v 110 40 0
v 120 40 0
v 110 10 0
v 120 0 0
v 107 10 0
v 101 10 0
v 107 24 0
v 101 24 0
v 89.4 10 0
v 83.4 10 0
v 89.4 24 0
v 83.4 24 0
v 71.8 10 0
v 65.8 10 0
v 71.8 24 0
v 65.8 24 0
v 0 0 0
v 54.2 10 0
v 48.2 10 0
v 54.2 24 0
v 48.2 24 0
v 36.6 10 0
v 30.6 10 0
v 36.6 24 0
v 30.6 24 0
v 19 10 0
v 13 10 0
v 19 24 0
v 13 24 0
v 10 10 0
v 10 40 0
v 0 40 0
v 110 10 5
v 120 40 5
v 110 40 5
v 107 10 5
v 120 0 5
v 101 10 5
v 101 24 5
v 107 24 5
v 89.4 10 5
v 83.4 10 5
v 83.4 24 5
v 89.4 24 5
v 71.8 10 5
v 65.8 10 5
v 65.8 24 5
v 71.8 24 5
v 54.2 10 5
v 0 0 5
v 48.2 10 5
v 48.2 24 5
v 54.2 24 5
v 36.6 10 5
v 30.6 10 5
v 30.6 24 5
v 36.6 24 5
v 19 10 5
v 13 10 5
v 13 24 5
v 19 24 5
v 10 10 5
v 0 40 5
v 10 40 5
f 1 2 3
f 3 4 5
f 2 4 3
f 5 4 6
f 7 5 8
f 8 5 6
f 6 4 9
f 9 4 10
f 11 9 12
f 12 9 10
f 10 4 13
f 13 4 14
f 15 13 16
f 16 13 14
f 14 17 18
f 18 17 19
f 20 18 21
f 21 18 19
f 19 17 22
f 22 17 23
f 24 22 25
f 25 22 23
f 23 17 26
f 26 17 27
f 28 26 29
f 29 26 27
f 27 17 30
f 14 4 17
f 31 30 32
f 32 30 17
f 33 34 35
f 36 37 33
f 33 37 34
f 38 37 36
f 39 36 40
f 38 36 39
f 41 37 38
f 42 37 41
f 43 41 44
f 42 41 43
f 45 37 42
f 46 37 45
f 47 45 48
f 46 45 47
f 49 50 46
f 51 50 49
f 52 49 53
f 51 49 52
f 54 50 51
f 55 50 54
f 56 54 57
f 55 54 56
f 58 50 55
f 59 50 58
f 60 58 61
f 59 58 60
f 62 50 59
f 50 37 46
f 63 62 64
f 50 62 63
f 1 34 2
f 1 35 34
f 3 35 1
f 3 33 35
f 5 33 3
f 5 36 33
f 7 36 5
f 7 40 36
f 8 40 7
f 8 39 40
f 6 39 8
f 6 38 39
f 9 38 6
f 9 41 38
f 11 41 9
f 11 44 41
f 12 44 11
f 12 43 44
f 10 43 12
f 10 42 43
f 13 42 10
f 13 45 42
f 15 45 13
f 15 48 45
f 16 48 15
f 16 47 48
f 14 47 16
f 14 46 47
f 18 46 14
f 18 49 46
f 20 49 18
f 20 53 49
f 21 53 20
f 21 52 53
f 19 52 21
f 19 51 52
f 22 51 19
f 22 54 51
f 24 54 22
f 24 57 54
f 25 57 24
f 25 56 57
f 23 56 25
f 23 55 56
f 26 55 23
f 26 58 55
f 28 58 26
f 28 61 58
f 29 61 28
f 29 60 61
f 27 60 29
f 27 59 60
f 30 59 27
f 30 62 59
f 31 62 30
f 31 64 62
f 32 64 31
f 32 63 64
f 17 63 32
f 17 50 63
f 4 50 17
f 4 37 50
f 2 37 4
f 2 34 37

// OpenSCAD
$fn = 32;

// ----------------------------------------------------------------------
// Guard grille: 6 slats over a 120 x 40 mm plate
// ----------------------------------------------------------------------

// --- parameters (mm) ---
profile_height = 5;       // extrusion height
profile_points = 32;      // points of the closed outline

profile = [[0, 0], [120, 0], [120, 40], [110, 40], [110, 10], [107, 10], [107, 24], [101, 24], [101, 10], [89.4, 10], [89.4, 24], [83.4, 24], [83.4, 10], [71.8, 10], [71.8, 24], [65.8, 24], [65.8, 10], [54.2, 10], [54.2, 24], [48.2, 24], [48.2, 10], [36.6, 10], [36.6, 24], [30.6, 24], [30.6, 10], [19, 10], [19, 24], [13, 24], [13, 10], [10, 10], [10, 40], [0, 40]];  // single closed polygon, 32 points, counter clockwise

// --- the one profile operation ---
linear_extrude(height = profile_height) polygon(points = profile);
